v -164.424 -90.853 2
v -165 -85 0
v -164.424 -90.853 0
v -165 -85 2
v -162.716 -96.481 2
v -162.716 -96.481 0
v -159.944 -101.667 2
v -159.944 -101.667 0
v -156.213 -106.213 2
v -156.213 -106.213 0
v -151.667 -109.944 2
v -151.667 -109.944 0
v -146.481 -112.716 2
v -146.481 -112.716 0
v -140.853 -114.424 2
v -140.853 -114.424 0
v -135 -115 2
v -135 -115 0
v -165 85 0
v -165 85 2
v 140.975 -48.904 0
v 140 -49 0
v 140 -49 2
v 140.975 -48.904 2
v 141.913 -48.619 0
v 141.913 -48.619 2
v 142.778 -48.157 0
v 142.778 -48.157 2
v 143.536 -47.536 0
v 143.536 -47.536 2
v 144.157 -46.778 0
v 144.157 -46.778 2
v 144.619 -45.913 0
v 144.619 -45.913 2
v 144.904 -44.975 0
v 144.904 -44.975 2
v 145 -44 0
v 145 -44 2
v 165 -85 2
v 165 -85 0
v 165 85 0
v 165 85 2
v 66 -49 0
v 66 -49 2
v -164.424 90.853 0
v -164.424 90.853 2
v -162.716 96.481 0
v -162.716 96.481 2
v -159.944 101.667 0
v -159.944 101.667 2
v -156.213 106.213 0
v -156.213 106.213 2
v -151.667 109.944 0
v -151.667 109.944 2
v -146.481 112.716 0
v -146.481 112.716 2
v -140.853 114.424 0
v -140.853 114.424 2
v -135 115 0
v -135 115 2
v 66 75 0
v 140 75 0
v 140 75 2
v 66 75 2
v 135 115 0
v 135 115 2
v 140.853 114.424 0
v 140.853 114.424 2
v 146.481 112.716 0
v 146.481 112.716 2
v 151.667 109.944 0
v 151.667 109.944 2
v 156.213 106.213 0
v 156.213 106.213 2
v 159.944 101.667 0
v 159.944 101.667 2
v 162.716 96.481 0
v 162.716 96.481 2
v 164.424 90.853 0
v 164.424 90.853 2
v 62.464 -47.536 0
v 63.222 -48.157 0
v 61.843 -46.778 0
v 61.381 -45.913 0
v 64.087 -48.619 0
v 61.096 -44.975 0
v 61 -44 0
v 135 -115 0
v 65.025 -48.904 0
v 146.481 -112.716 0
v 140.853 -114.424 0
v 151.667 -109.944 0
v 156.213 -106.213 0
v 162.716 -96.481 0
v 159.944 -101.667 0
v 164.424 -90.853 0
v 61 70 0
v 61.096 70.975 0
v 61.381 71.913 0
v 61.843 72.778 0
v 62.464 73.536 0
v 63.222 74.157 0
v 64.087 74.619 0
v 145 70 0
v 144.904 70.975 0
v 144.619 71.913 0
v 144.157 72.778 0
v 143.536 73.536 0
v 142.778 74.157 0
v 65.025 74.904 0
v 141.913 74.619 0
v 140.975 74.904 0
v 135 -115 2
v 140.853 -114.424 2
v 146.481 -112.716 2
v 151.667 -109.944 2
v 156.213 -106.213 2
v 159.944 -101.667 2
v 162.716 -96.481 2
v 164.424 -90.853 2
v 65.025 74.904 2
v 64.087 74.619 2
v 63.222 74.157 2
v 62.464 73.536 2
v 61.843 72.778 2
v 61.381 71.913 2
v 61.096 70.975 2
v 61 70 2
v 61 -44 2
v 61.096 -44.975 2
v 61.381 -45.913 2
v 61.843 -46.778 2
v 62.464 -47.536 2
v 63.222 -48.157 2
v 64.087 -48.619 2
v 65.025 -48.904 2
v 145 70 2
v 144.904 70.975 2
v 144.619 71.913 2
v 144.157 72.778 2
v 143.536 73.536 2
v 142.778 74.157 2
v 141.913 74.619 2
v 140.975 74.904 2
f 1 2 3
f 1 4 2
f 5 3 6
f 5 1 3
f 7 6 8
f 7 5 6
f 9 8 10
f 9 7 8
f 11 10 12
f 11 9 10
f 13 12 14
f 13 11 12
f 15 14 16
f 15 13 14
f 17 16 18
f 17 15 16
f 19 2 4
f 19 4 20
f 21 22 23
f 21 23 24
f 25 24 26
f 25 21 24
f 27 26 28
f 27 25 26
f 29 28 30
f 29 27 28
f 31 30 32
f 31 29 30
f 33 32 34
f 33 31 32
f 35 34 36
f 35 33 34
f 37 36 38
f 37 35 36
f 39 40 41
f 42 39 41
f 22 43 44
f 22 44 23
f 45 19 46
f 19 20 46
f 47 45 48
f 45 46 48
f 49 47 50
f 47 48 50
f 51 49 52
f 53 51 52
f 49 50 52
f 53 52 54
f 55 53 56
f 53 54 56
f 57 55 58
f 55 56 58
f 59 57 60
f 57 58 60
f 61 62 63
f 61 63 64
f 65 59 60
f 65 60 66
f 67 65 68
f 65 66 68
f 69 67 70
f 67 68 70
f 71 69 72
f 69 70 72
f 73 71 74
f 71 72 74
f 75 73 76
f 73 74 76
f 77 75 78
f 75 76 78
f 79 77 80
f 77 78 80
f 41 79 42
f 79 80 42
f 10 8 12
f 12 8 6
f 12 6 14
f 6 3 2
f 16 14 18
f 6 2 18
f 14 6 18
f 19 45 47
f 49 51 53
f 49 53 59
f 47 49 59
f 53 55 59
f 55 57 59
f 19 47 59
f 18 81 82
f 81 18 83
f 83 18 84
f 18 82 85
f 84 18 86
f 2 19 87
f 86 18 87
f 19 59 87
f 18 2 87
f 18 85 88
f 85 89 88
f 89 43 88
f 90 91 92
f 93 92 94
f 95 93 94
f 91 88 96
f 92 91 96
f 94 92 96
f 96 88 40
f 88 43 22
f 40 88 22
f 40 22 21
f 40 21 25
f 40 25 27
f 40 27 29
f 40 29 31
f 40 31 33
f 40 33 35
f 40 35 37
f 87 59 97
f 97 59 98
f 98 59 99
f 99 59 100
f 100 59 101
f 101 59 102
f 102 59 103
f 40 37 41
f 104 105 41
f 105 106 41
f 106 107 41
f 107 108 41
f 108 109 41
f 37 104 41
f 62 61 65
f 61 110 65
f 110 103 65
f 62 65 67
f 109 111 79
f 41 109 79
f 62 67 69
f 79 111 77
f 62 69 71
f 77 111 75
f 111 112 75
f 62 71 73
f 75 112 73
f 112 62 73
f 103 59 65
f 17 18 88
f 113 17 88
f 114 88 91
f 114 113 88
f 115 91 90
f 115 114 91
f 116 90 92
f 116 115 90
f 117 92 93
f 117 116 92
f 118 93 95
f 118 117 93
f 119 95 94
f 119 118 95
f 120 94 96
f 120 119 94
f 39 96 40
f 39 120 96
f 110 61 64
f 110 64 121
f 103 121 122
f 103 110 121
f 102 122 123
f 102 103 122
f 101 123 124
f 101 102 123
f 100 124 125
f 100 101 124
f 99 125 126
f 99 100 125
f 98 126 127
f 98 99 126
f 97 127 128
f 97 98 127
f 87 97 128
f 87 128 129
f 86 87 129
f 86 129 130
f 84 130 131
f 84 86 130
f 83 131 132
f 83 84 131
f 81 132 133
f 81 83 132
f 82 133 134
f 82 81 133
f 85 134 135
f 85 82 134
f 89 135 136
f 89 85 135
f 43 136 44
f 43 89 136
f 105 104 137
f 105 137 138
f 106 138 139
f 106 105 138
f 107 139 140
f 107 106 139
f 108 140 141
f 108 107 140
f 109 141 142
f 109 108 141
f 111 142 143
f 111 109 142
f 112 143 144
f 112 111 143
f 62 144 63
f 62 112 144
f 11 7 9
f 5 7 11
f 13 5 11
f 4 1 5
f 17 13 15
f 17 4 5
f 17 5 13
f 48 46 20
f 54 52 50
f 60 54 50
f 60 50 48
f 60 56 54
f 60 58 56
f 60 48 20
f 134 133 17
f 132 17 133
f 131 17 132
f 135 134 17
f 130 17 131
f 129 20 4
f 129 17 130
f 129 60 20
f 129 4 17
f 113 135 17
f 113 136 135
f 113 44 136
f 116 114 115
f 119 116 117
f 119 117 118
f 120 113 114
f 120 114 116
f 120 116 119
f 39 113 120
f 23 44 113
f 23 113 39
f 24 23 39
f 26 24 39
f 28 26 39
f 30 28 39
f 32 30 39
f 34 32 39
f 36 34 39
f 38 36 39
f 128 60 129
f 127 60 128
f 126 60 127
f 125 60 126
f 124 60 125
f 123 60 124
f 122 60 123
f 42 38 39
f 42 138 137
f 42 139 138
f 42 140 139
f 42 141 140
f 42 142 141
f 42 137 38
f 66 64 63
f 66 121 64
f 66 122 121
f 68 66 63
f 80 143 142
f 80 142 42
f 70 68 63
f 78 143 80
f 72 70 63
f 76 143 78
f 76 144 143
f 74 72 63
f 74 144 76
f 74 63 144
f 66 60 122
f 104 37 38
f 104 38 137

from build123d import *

# Parameters (mm, degrees)
SKETCH1_W           = 330
SKETCH1_H           = 230
BOSS_EXTRUDE1_DEPTH = 2
CUT_EXTRUDE1_DEPTH  = 2
FILLET1_R           = 30


with BuildPart() as part:
    # Sketch1 → Boss-Extrude1 (new body)
    with BuildSketch(Plane.XY):
        Rectangle(SKETCH1_W, SKETCH1_H)
    extrude(amount=BOSS_EXTRUDE1_DEPTH)

    # Sketch2 → Cut-Extrude1 (cut)
    with BuildSketch(Plane(origin=(0, 0, 0), x_dir=(-1, 0, 0), z_dir=(0, 0, -1))):
        with BuildLine():
            Line((-140, 75), (-66, 75))
            ThreePointArc((-66, 75), (-62.464466094, 73.535533906), (-61, 70))
            Line((-61, 70), (-61, -44))
            ThreePointArc((-61, -44), (-62.464466094, -47.535533906), (-66, -49))
            Line((-66, -49), (-140, -49))
            ThreePointArc((-140, -49), (-143.535533906, -47.535533906), (-145, -44))
            Line((-145, -44), (-145, 70))
            ThreePointArc((-145, 70), (-143.535533906, 73.535533906), (-140, 75))
        make_face()
    extrude(amount=-CUT_EXTRUDE1_DEPTH, mode=Mode.SUBTRACT)

    # Fillet1
    fillet1_edges = [part.edges().sort_by_distance(p)[0] for p in [
        (165, -115, 1),
        (-165, -115, 1),
        (-165, 115, 1),
        (165, 115, 1),
    ]]
    fillet(fillet1_edges, radius=FILLET1_R)


solid = part.part
